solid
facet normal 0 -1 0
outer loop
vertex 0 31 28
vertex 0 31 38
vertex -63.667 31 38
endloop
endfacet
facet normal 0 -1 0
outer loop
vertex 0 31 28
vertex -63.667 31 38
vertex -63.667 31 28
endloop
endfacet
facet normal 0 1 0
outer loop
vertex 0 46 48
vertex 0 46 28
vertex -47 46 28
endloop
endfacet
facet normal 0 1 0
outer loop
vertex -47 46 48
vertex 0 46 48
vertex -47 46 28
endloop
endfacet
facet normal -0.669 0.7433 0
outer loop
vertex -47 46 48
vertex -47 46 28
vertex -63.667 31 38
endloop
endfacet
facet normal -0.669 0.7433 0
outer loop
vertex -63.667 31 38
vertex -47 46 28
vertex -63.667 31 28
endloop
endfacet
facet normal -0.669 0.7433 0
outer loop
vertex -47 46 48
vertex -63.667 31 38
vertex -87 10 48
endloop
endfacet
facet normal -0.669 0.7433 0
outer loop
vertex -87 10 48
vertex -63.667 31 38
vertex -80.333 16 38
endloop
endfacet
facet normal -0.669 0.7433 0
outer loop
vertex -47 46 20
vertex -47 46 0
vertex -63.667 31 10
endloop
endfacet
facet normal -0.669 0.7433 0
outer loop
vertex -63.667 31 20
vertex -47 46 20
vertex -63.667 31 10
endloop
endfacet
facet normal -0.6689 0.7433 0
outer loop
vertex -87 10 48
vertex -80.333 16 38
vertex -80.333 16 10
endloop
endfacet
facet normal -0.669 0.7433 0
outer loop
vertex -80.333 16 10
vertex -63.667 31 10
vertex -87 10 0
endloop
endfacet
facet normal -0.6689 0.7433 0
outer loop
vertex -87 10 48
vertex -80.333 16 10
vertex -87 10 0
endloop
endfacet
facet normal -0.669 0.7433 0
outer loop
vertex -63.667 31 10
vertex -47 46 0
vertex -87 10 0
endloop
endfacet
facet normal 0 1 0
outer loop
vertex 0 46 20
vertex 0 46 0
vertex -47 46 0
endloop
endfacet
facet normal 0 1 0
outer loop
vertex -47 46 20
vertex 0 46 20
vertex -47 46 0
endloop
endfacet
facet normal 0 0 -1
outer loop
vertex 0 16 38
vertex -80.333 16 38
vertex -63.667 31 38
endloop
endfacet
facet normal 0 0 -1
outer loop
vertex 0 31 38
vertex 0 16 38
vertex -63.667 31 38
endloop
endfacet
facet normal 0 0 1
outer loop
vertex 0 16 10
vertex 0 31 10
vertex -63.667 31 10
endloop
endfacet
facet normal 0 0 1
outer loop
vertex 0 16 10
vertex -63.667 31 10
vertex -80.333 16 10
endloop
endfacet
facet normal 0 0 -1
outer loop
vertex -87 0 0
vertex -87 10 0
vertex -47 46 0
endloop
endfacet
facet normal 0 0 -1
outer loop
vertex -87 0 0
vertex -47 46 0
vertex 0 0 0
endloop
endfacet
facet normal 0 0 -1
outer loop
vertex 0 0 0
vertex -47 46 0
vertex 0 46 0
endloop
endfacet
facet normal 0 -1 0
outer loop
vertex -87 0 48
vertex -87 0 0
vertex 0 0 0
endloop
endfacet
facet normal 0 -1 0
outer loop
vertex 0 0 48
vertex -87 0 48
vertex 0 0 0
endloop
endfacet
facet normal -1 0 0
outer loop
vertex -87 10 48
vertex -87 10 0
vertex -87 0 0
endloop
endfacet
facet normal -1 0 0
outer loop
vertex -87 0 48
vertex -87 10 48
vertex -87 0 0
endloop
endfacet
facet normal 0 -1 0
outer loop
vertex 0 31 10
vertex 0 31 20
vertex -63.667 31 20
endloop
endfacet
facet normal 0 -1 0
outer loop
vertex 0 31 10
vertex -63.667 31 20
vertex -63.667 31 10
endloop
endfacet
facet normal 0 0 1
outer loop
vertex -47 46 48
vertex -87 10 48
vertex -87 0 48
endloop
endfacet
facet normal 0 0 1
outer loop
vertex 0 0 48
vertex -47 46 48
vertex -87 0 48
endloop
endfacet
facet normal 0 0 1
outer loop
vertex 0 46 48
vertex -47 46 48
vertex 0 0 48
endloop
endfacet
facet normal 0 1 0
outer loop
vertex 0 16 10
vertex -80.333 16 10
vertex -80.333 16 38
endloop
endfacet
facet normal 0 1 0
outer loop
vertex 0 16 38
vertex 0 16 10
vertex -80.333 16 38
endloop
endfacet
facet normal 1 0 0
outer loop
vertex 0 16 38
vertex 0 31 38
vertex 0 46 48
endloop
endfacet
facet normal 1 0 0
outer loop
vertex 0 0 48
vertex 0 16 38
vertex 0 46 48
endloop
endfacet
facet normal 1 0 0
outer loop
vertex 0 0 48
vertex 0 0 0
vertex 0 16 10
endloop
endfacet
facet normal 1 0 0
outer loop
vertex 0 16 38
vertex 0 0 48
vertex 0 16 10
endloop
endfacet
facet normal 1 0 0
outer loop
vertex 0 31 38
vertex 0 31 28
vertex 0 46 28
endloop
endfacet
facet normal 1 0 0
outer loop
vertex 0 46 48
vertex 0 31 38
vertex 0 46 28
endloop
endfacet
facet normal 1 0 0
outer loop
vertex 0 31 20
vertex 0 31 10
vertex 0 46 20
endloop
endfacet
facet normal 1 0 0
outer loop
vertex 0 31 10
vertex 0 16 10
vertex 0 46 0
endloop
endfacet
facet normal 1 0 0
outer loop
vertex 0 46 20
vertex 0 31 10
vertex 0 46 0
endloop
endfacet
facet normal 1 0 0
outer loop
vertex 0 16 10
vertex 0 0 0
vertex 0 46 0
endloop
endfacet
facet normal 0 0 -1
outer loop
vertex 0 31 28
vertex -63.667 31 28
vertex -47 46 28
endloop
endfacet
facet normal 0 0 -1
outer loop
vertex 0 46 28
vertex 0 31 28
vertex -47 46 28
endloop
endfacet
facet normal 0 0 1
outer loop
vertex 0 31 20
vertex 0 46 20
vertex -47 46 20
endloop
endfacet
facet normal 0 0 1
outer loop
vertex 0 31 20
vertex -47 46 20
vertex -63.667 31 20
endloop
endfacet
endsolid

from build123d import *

# Parameters (mm, degrees)
BOSS_EXTRUDE1_DEPTH = 48
CUT_EXTRUDE1_DEPTH  = 110.494292089


with BuildPart() as part:
    # Sketch2 → Boss-Extrude1 (new body)
    with BuildSketch(Plane.XY):
        Polygon((0, 0), (0, 46), (-47, 46), (-87, 10), (-87, 0), align=None)
    extrude(amount=BOSS_EXTRUDE1_DEPTH)

    # Sketch3 → Cut-Extrude1 (cut, through all)
    with BuildSketch(Plane(origin=(0, 0, 0), x_dir=(0, 0, -1), z_dir=(1, 0, 0))):
        Polygon((-28, 46), (-20, 46), (-20, 31), (-10, 31), (-10, 16), (-38, 16), (-38, 31), (-28, 31), align=None)
    extrude(amount=-CUT_EXTRUDE1_DEPTH, mode=Mode.SUBTRACT)


solid = part.part
